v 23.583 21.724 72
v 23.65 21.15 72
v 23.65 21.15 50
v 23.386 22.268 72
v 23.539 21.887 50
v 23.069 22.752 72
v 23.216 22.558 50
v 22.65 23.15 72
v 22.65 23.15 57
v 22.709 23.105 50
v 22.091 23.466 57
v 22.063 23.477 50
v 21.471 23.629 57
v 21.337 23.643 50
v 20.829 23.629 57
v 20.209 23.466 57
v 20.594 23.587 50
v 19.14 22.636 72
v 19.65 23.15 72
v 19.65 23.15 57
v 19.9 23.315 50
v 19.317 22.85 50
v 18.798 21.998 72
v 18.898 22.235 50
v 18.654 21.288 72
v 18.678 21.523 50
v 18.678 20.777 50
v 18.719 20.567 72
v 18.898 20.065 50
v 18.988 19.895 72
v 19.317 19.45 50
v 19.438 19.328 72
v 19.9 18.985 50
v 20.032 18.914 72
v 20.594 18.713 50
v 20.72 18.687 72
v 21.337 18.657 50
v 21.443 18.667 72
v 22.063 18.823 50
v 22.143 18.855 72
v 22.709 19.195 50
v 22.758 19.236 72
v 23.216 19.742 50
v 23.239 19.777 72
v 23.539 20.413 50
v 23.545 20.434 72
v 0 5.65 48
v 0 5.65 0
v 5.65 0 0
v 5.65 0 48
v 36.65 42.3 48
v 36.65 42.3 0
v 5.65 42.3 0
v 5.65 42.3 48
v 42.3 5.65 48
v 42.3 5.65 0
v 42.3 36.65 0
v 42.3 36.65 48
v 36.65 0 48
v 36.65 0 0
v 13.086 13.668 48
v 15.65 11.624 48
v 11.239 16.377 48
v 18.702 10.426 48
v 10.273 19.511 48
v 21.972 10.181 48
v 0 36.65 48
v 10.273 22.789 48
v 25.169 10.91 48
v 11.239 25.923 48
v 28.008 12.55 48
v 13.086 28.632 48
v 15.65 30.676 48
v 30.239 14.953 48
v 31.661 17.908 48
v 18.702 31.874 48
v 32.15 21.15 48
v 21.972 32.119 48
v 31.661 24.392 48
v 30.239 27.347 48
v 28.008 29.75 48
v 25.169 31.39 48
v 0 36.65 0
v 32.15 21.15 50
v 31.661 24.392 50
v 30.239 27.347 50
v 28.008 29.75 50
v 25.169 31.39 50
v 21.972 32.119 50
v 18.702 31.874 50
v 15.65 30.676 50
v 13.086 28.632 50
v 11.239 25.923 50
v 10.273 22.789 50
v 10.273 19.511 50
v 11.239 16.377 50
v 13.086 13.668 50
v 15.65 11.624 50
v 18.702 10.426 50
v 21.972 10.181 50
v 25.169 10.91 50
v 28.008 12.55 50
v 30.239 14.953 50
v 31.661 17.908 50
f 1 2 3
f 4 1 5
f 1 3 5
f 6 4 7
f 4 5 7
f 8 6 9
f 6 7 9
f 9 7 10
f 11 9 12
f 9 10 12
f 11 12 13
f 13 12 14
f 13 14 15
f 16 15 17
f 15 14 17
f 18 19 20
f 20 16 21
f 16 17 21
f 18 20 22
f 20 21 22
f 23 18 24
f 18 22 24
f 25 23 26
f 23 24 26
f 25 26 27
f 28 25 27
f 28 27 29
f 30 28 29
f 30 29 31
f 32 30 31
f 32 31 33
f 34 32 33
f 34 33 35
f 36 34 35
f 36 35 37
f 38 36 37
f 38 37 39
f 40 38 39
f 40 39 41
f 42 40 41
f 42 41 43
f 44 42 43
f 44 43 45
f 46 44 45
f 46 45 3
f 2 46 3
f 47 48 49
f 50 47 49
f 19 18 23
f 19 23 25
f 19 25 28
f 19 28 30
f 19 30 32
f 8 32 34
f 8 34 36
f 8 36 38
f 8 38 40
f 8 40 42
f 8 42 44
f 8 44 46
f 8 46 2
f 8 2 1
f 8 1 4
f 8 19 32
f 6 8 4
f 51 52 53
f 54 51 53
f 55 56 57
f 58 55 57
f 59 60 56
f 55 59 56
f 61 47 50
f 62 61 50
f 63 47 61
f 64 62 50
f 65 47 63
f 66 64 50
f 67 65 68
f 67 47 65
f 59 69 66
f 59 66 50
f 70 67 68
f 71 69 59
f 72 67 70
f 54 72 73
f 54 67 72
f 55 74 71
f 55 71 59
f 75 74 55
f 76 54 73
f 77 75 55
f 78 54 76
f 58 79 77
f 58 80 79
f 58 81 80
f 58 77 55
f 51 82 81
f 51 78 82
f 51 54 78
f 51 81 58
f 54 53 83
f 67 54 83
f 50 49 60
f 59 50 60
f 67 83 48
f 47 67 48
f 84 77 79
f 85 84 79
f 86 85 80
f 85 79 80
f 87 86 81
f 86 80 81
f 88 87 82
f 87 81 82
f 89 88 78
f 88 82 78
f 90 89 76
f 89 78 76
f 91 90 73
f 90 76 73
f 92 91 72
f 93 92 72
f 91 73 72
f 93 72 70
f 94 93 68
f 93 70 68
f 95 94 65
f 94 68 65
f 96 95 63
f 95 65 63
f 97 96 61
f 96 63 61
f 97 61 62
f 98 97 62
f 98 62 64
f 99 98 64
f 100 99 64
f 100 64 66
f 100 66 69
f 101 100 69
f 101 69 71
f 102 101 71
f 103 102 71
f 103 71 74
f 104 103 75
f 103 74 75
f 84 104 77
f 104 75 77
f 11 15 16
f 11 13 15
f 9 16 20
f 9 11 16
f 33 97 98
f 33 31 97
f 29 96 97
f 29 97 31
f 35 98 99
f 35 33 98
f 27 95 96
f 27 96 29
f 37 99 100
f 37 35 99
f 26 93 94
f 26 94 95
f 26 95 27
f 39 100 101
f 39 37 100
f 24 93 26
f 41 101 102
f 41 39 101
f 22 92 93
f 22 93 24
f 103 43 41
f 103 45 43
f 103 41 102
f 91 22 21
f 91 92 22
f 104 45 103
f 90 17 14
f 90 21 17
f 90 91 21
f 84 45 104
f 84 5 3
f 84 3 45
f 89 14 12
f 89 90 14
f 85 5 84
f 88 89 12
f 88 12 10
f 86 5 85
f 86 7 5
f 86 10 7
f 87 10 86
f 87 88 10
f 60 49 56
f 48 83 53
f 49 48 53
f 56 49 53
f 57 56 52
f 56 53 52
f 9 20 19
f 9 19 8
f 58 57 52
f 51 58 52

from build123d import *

# Parameters (mm, degrees)
BOSS_EXTRUDE1_DEPTH = 48
SKETCH3_R           = 11
BOSS_EXTRUDE2_DEPTH = 2
SKETCH4_R           = 2.5
BOSS_EXTRUDE3_DEPTH = 22
CUT_EXTRUDE2_START  = -15
CUT_EXTRUDE2_DEPTH  = 15


with BuildPart() as part:
    # Sketch2 → Boss-Extrude1 (new body)
    with BuildSketch(Plane.XY):
        Polygon((5.65, 0), (36.65, 0), (42.3, 5.65), (42.3, 36.65), (36.65, 42.3), (5.65, 42.3), (0, 36.65), (0, 5.65), align=None)
    extrude(amount=BOSS_EXTRUDE1_DEPTH)

    # Sketch3 → Boss-Extrude2 (add)
    with BuildSketch(Plane.XY.offset(48)):
        with Locations((21.15, 21.15)):
            Circle(SKETCH3_R)
    extrude(amount=BOSS_EXTRUDE2_DEPTH)

    # Sketch4 → Boss-Extrude3 (add)
    with BuildSketch(Plane.XY.offset(50)):
        with Locations((21.15, 21.15)):
            Circle(SKETCH4_R)
    extrude(amount=BOSS_EXTRUDE3_DEPTH)

    # Sketch5 → Cut-Extrude2 (cut)
    with BuildSketch(Plane.XY.offset(72).offset(CUT_EXTRUDE2_START)):
        with BuildLine():
            ThreePointArc((19.65, 23.15), (20.359430585, 23.521708245), (21.15, 23.65))
            ThreePointArc((21.15, 23.65), (21.940569415, 23.521708245), (22.65, 23.15))
            Line((22.65, 23.15), (25.205995561, 23.15))
            Line((25.205995561, 23.15), (25.205995561, 25.058533995))
            Line((25.205995561, 25.058533995), (17.955034994, 25.058533995))
            Line((17.955034994, 25.058533995), (17.955034994, 23.15))
            Line((17.955034994, 23.15), (19.65, 23.15))
        make_face()
        with BuildLine():
            ThreePointArc((22.65, 23.15), (21.940569415, 23.521708245), (21.15, 23.65))
            Line((21.15, 23.65), (21.15, 23.15))
            Line((21.15, 23.15), (22.65, 23.15))
        make_face()
        with BuildLine():
            Line((21.15, 23.15), (21.15, 23.65))
            ThreePointArc((21.15, 23.65), (20.359430585, 23.521708245), (19.65, 23.15))
            Line((19.65, 23.15), (21.15, 23.15))
        make_face()
    extrude(amount=CUT_EXTRUDE2_DEPTH, mode=Mode.SUBTRACT)


solid = part.part
